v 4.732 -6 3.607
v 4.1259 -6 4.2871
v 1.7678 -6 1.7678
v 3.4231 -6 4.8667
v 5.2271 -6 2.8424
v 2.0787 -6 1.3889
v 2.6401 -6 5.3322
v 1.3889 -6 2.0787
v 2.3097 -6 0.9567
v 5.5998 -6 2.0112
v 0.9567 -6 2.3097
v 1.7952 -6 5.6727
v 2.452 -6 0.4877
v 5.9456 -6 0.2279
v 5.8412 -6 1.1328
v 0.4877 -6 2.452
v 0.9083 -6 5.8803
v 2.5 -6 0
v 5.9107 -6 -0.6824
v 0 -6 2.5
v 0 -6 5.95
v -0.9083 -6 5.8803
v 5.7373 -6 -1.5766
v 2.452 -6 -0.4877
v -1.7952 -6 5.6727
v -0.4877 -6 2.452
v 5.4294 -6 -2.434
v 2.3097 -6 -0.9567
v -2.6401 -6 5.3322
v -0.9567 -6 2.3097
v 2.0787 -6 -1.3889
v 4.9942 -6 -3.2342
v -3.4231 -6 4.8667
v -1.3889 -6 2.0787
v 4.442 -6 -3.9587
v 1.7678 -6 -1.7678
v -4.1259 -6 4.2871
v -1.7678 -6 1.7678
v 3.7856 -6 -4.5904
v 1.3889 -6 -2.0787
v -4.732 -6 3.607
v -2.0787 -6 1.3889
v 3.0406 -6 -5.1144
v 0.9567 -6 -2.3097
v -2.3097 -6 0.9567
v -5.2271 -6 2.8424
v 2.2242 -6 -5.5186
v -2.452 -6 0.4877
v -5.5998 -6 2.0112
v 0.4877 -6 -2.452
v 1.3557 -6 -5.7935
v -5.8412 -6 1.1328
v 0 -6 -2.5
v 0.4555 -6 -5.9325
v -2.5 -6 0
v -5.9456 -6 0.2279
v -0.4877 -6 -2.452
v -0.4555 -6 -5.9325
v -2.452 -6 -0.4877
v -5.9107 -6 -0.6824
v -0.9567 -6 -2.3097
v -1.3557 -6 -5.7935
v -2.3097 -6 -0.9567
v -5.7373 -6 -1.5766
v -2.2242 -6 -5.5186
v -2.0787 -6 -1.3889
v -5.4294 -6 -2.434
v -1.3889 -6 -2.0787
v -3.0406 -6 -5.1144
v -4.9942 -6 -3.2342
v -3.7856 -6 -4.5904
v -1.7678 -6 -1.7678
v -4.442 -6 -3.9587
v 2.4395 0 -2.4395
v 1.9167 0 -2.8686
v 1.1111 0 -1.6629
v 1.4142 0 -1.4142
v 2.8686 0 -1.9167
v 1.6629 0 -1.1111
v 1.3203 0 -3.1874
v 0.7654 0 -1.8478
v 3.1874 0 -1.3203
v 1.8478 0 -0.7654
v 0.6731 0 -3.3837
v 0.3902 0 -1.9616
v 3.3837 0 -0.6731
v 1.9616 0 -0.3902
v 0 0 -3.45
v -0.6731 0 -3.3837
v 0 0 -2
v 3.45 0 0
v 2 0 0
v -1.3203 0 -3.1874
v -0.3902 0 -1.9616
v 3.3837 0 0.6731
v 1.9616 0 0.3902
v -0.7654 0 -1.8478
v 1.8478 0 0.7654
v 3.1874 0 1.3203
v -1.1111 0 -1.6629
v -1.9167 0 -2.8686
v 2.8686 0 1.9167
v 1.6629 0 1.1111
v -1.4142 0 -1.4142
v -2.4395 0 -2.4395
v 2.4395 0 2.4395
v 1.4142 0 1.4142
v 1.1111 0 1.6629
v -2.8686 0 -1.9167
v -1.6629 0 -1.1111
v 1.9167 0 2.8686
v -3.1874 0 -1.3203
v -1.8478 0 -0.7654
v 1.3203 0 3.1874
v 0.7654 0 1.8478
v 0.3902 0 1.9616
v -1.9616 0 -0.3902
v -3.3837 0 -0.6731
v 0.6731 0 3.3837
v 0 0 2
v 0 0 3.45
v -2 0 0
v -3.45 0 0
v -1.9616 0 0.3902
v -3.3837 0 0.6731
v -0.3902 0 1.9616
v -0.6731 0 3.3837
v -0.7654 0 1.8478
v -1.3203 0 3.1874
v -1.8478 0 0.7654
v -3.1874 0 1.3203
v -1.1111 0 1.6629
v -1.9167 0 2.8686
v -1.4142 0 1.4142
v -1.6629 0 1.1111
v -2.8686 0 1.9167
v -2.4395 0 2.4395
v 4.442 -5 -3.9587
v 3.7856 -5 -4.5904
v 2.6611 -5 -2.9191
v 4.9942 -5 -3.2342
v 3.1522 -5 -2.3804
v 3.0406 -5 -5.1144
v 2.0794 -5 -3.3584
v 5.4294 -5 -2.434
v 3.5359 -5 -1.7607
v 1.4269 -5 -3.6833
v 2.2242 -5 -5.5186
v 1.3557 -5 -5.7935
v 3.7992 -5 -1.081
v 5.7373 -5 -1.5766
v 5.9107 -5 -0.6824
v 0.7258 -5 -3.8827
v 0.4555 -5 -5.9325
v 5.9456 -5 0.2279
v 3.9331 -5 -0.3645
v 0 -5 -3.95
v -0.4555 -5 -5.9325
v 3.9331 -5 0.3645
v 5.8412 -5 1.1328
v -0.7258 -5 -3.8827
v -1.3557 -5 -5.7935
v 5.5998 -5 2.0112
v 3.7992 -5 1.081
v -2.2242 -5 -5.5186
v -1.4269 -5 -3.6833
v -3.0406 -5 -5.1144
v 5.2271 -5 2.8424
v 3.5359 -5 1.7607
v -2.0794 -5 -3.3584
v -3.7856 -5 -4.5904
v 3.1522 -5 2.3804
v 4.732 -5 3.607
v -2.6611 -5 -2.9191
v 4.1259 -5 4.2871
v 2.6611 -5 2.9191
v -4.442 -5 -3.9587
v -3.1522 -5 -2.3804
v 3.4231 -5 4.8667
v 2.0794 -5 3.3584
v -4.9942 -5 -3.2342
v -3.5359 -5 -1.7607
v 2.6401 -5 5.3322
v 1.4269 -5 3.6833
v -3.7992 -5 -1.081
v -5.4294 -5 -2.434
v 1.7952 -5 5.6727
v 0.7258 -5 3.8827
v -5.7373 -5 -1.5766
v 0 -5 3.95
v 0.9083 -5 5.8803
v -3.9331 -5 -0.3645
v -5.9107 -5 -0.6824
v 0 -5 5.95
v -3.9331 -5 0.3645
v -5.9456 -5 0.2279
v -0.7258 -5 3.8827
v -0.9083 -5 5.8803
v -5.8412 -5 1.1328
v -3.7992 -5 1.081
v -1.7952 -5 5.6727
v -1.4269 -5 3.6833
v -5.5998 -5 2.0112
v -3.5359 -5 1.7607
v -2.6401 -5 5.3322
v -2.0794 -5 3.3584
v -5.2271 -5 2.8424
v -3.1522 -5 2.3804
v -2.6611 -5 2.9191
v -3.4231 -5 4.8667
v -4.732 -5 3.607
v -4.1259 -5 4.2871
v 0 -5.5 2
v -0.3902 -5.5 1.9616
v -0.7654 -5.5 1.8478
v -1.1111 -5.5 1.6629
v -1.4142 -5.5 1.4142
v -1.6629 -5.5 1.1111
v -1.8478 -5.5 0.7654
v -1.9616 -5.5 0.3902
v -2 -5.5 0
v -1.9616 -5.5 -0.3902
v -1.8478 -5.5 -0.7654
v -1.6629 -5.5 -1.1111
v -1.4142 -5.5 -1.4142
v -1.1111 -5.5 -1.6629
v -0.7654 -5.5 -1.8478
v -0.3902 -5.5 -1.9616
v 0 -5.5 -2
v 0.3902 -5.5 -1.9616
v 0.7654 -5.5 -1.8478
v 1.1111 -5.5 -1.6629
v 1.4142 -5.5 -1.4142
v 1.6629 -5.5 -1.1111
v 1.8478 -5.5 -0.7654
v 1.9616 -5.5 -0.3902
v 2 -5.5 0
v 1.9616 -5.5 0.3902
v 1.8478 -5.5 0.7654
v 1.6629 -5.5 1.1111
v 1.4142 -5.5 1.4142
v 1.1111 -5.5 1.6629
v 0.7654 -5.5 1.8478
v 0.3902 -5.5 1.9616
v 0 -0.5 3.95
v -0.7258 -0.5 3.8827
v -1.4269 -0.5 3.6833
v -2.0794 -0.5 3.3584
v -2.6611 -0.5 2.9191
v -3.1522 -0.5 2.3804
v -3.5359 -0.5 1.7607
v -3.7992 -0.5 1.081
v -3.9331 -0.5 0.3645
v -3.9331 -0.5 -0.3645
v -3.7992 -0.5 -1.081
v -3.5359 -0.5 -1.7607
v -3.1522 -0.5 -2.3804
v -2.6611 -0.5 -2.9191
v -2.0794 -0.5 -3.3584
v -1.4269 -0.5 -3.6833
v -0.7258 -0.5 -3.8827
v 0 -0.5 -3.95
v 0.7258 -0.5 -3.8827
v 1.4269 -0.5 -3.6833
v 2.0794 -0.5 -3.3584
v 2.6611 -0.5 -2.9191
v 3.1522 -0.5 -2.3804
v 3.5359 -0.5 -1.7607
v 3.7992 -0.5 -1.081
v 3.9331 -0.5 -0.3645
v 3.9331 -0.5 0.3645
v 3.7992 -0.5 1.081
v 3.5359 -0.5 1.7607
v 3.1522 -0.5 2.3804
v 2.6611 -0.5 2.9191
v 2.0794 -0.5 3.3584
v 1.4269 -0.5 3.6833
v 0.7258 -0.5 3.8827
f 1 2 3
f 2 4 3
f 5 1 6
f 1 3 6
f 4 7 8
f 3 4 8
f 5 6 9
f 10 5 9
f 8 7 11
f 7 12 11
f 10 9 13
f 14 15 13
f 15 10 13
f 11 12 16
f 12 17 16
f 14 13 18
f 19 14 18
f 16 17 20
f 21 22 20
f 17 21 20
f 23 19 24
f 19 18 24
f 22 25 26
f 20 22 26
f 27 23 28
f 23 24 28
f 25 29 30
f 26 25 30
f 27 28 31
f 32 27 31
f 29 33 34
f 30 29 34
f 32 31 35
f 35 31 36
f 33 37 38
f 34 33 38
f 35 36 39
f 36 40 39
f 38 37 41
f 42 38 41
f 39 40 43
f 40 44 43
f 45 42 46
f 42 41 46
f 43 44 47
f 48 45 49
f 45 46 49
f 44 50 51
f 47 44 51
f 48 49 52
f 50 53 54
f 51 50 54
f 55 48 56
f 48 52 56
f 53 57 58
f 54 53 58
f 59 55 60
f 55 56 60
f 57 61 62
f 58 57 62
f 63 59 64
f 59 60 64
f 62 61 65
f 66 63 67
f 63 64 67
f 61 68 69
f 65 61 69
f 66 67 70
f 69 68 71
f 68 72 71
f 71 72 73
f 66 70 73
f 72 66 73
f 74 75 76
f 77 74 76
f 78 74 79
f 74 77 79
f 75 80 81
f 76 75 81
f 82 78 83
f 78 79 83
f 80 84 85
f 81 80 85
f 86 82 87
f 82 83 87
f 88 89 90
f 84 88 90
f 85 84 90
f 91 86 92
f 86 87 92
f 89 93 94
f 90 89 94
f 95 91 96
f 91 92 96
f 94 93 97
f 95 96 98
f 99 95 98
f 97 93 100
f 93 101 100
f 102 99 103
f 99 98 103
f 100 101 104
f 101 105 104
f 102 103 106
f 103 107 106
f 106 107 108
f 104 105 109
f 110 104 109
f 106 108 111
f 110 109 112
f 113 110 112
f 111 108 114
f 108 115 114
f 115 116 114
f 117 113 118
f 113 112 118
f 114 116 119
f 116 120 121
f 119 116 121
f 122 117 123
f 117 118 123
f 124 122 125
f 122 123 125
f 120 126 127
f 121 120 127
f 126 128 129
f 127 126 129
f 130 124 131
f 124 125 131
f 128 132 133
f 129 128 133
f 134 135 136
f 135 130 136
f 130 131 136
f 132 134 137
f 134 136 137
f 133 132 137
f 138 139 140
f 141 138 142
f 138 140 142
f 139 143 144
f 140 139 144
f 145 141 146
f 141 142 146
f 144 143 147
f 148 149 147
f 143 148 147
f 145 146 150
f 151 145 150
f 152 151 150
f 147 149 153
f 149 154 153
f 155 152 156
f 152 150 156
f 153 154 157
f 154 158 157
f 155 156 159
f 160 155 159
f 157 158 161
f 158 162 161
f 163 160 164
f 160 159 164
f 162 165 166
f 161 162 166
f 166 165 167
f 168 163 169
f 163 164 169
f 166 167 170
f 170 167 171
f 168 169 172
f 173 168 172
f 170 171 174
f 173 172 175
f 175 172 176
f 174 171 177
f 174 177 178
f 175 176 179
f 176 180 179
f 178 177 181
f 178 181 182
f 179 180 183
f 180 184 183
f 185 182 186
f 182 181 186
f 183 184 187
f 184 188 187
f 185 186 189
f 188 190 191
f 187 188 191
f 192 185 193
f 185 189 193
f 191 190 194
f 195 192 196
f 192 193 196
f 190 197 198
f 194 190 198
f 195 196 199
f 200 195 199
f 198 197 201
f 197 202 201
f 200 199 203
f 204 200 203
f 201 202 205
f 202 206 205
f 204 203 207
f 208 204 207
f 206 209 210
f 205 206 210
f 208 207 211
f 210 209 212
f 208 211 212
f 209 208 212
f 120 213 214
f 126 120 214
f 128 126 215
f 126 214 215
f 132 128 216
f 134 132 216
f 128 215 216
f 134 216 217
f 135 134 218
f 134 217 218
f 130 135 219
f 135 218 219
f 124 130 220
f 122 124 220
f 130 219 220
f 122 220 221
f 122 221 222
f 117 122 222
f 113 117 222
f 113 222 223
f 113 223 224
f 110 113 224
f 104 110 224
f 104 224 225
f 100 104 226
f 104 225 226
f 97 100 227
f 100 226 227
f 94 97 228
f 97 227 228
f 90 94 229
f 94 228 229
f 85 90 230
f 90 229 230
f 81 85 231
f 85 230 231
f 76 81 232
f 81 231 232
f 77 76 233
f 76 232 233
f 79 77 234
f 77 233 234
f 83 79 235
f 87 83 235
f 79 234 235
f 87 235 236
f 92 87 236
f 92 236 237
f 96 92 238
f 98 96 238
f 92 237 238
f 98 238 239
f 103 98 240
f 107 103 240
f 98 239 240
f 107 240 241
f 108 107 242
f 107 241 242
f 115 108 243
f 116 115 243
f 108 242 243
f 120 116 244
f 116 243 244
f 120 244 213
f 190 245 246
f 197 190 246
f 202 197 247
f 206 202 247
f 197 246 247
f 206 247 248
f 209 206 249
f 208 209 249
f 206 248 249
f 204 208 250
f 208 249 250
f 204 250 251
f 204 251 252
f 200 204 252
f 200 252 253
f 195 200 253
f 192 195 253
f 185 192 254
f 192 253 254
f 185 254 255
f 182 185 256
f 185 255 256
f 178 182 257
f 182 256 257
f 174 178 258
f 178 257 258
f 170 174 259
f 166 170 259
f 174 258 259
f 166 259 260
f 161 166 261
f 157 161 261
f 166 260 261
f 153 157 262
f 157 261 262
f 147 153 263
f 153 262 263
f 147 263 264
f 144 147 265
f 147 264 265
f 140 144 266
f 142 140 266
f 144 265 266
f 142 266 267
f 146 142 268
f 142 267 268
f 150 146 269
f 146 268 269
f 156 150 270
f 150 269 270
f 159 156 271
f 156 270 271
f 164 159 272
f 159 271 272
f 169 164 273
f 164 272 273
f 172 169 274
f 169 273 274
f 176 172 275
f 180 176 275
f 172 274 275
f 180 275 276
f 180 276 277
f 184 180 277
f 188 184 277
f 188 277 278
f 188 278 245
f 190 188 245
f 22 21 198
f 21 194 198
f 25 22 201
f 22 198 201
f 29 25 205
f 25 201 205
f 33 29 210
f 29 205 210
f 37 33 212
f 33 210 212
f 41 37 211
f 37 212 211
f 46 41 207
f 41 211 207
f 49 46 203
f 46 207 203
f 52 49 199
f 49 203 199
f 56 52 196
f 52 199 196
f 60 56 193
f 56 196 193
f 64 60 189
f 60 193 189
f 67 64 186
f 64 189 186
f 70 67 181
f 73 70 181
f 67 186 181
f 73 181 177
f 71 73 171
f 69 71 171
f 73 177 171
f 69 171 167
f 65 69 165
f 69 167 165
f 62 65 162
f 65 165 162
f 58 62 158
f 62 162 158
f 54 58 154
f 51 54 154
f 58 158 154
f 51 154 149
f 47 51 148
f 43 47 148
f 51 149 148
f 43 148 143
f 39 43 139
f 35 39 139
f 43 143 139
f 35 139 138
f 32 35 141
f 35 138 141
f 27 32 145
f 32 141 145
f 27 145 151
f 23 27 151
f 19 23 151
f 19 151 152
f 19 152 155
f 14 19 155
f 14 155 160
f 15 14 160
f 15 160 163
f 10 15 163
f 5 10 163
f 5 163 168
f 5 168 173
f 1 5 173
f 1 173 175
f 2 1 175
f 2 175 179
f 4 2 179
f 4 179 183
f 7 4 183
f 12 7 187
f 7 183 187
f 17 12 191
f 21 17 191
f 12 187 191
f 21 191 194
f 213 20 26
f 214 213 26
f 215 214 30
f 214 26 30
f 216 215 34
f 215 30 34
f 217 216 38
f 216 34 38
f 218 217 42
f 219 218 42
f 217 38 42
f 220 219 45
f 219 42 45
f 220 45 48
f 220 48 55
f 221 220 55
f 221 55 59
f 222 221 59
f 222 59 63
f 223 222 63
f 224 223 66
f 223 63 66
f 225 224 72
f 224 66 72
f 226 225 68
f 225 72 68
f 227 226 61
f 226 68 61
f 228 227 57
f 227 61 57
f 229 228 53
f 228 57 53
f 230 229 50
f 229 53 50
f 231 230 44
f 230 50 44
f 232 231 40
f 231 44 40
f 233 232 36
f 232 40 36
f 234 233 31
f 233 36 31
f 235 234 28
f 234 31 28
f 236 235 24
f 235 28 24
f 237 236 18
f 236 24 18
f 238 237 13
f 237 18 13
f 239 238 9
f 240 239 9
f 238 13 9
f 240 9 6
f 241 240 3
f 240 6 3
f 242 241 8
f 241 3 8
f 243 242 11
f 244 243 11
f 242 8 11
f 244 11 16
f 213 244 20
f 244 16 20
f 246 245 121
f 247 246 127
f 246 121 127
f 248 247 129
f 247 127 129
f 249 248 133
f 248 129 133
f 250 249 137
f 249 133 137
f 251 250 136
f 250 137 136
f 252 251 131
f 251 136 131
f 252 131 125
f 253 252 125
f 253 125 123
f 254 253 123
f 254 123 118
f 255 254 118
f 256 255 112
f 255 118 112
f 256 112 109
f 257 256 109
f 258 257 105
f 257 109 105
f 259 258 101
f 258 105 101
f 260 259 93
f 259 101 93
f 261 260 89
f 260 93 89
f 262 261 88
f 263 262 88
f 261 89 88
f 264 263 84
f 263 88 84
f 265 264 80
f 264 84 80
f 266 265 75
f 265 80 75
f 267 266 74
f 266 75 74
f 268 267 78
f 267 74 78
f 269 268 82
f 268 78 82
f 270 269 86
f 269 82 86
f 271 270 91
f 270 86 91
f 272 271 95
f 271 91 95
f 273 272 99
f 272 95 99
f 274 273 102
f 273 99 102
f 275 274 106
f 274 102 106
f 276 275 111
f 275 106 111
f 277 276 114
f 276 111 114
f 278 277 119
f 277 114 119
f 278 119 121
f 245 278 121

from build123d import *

# Parameters (mm, degrees)
FASE1_SIZE = 0.5
FASE2_SIZE = 0.5


with BuildPart() as part:
    # Skizze1 → Rotation1 (revolve)
    with BuildSketch(Plane.XY, mode=Mode.PRIVATE) as rotation1_sk:
        Polygon((2, 0), (2, -6), (5.95, -6), (5.95, -5), (3.95, -5), (3.95, 0), align=None)
    revolve(rotation1_sk.sketch.rotate(Axis((0, 16.559935445, 0), (0, -1, 0)), 90), axis=Axis((0, 16.559935445, 0), (0, -1, 0)))

    # Fase1
    fase1_edges = [part.edges().sort_by_distance(p)[0] for p in [
        (0, 0, -3.95),
    ]]
    chamfer(fase1_edges, length=FASE1_SIZE)

    # Fase2
    fase2_edges = [part.edges().sort_by_distance(p)[0] for p in [
        (0, -6, -2),
    ]]
    chamfer(fase2_edges, length=FASE2_SIZE)


solid = part.part
